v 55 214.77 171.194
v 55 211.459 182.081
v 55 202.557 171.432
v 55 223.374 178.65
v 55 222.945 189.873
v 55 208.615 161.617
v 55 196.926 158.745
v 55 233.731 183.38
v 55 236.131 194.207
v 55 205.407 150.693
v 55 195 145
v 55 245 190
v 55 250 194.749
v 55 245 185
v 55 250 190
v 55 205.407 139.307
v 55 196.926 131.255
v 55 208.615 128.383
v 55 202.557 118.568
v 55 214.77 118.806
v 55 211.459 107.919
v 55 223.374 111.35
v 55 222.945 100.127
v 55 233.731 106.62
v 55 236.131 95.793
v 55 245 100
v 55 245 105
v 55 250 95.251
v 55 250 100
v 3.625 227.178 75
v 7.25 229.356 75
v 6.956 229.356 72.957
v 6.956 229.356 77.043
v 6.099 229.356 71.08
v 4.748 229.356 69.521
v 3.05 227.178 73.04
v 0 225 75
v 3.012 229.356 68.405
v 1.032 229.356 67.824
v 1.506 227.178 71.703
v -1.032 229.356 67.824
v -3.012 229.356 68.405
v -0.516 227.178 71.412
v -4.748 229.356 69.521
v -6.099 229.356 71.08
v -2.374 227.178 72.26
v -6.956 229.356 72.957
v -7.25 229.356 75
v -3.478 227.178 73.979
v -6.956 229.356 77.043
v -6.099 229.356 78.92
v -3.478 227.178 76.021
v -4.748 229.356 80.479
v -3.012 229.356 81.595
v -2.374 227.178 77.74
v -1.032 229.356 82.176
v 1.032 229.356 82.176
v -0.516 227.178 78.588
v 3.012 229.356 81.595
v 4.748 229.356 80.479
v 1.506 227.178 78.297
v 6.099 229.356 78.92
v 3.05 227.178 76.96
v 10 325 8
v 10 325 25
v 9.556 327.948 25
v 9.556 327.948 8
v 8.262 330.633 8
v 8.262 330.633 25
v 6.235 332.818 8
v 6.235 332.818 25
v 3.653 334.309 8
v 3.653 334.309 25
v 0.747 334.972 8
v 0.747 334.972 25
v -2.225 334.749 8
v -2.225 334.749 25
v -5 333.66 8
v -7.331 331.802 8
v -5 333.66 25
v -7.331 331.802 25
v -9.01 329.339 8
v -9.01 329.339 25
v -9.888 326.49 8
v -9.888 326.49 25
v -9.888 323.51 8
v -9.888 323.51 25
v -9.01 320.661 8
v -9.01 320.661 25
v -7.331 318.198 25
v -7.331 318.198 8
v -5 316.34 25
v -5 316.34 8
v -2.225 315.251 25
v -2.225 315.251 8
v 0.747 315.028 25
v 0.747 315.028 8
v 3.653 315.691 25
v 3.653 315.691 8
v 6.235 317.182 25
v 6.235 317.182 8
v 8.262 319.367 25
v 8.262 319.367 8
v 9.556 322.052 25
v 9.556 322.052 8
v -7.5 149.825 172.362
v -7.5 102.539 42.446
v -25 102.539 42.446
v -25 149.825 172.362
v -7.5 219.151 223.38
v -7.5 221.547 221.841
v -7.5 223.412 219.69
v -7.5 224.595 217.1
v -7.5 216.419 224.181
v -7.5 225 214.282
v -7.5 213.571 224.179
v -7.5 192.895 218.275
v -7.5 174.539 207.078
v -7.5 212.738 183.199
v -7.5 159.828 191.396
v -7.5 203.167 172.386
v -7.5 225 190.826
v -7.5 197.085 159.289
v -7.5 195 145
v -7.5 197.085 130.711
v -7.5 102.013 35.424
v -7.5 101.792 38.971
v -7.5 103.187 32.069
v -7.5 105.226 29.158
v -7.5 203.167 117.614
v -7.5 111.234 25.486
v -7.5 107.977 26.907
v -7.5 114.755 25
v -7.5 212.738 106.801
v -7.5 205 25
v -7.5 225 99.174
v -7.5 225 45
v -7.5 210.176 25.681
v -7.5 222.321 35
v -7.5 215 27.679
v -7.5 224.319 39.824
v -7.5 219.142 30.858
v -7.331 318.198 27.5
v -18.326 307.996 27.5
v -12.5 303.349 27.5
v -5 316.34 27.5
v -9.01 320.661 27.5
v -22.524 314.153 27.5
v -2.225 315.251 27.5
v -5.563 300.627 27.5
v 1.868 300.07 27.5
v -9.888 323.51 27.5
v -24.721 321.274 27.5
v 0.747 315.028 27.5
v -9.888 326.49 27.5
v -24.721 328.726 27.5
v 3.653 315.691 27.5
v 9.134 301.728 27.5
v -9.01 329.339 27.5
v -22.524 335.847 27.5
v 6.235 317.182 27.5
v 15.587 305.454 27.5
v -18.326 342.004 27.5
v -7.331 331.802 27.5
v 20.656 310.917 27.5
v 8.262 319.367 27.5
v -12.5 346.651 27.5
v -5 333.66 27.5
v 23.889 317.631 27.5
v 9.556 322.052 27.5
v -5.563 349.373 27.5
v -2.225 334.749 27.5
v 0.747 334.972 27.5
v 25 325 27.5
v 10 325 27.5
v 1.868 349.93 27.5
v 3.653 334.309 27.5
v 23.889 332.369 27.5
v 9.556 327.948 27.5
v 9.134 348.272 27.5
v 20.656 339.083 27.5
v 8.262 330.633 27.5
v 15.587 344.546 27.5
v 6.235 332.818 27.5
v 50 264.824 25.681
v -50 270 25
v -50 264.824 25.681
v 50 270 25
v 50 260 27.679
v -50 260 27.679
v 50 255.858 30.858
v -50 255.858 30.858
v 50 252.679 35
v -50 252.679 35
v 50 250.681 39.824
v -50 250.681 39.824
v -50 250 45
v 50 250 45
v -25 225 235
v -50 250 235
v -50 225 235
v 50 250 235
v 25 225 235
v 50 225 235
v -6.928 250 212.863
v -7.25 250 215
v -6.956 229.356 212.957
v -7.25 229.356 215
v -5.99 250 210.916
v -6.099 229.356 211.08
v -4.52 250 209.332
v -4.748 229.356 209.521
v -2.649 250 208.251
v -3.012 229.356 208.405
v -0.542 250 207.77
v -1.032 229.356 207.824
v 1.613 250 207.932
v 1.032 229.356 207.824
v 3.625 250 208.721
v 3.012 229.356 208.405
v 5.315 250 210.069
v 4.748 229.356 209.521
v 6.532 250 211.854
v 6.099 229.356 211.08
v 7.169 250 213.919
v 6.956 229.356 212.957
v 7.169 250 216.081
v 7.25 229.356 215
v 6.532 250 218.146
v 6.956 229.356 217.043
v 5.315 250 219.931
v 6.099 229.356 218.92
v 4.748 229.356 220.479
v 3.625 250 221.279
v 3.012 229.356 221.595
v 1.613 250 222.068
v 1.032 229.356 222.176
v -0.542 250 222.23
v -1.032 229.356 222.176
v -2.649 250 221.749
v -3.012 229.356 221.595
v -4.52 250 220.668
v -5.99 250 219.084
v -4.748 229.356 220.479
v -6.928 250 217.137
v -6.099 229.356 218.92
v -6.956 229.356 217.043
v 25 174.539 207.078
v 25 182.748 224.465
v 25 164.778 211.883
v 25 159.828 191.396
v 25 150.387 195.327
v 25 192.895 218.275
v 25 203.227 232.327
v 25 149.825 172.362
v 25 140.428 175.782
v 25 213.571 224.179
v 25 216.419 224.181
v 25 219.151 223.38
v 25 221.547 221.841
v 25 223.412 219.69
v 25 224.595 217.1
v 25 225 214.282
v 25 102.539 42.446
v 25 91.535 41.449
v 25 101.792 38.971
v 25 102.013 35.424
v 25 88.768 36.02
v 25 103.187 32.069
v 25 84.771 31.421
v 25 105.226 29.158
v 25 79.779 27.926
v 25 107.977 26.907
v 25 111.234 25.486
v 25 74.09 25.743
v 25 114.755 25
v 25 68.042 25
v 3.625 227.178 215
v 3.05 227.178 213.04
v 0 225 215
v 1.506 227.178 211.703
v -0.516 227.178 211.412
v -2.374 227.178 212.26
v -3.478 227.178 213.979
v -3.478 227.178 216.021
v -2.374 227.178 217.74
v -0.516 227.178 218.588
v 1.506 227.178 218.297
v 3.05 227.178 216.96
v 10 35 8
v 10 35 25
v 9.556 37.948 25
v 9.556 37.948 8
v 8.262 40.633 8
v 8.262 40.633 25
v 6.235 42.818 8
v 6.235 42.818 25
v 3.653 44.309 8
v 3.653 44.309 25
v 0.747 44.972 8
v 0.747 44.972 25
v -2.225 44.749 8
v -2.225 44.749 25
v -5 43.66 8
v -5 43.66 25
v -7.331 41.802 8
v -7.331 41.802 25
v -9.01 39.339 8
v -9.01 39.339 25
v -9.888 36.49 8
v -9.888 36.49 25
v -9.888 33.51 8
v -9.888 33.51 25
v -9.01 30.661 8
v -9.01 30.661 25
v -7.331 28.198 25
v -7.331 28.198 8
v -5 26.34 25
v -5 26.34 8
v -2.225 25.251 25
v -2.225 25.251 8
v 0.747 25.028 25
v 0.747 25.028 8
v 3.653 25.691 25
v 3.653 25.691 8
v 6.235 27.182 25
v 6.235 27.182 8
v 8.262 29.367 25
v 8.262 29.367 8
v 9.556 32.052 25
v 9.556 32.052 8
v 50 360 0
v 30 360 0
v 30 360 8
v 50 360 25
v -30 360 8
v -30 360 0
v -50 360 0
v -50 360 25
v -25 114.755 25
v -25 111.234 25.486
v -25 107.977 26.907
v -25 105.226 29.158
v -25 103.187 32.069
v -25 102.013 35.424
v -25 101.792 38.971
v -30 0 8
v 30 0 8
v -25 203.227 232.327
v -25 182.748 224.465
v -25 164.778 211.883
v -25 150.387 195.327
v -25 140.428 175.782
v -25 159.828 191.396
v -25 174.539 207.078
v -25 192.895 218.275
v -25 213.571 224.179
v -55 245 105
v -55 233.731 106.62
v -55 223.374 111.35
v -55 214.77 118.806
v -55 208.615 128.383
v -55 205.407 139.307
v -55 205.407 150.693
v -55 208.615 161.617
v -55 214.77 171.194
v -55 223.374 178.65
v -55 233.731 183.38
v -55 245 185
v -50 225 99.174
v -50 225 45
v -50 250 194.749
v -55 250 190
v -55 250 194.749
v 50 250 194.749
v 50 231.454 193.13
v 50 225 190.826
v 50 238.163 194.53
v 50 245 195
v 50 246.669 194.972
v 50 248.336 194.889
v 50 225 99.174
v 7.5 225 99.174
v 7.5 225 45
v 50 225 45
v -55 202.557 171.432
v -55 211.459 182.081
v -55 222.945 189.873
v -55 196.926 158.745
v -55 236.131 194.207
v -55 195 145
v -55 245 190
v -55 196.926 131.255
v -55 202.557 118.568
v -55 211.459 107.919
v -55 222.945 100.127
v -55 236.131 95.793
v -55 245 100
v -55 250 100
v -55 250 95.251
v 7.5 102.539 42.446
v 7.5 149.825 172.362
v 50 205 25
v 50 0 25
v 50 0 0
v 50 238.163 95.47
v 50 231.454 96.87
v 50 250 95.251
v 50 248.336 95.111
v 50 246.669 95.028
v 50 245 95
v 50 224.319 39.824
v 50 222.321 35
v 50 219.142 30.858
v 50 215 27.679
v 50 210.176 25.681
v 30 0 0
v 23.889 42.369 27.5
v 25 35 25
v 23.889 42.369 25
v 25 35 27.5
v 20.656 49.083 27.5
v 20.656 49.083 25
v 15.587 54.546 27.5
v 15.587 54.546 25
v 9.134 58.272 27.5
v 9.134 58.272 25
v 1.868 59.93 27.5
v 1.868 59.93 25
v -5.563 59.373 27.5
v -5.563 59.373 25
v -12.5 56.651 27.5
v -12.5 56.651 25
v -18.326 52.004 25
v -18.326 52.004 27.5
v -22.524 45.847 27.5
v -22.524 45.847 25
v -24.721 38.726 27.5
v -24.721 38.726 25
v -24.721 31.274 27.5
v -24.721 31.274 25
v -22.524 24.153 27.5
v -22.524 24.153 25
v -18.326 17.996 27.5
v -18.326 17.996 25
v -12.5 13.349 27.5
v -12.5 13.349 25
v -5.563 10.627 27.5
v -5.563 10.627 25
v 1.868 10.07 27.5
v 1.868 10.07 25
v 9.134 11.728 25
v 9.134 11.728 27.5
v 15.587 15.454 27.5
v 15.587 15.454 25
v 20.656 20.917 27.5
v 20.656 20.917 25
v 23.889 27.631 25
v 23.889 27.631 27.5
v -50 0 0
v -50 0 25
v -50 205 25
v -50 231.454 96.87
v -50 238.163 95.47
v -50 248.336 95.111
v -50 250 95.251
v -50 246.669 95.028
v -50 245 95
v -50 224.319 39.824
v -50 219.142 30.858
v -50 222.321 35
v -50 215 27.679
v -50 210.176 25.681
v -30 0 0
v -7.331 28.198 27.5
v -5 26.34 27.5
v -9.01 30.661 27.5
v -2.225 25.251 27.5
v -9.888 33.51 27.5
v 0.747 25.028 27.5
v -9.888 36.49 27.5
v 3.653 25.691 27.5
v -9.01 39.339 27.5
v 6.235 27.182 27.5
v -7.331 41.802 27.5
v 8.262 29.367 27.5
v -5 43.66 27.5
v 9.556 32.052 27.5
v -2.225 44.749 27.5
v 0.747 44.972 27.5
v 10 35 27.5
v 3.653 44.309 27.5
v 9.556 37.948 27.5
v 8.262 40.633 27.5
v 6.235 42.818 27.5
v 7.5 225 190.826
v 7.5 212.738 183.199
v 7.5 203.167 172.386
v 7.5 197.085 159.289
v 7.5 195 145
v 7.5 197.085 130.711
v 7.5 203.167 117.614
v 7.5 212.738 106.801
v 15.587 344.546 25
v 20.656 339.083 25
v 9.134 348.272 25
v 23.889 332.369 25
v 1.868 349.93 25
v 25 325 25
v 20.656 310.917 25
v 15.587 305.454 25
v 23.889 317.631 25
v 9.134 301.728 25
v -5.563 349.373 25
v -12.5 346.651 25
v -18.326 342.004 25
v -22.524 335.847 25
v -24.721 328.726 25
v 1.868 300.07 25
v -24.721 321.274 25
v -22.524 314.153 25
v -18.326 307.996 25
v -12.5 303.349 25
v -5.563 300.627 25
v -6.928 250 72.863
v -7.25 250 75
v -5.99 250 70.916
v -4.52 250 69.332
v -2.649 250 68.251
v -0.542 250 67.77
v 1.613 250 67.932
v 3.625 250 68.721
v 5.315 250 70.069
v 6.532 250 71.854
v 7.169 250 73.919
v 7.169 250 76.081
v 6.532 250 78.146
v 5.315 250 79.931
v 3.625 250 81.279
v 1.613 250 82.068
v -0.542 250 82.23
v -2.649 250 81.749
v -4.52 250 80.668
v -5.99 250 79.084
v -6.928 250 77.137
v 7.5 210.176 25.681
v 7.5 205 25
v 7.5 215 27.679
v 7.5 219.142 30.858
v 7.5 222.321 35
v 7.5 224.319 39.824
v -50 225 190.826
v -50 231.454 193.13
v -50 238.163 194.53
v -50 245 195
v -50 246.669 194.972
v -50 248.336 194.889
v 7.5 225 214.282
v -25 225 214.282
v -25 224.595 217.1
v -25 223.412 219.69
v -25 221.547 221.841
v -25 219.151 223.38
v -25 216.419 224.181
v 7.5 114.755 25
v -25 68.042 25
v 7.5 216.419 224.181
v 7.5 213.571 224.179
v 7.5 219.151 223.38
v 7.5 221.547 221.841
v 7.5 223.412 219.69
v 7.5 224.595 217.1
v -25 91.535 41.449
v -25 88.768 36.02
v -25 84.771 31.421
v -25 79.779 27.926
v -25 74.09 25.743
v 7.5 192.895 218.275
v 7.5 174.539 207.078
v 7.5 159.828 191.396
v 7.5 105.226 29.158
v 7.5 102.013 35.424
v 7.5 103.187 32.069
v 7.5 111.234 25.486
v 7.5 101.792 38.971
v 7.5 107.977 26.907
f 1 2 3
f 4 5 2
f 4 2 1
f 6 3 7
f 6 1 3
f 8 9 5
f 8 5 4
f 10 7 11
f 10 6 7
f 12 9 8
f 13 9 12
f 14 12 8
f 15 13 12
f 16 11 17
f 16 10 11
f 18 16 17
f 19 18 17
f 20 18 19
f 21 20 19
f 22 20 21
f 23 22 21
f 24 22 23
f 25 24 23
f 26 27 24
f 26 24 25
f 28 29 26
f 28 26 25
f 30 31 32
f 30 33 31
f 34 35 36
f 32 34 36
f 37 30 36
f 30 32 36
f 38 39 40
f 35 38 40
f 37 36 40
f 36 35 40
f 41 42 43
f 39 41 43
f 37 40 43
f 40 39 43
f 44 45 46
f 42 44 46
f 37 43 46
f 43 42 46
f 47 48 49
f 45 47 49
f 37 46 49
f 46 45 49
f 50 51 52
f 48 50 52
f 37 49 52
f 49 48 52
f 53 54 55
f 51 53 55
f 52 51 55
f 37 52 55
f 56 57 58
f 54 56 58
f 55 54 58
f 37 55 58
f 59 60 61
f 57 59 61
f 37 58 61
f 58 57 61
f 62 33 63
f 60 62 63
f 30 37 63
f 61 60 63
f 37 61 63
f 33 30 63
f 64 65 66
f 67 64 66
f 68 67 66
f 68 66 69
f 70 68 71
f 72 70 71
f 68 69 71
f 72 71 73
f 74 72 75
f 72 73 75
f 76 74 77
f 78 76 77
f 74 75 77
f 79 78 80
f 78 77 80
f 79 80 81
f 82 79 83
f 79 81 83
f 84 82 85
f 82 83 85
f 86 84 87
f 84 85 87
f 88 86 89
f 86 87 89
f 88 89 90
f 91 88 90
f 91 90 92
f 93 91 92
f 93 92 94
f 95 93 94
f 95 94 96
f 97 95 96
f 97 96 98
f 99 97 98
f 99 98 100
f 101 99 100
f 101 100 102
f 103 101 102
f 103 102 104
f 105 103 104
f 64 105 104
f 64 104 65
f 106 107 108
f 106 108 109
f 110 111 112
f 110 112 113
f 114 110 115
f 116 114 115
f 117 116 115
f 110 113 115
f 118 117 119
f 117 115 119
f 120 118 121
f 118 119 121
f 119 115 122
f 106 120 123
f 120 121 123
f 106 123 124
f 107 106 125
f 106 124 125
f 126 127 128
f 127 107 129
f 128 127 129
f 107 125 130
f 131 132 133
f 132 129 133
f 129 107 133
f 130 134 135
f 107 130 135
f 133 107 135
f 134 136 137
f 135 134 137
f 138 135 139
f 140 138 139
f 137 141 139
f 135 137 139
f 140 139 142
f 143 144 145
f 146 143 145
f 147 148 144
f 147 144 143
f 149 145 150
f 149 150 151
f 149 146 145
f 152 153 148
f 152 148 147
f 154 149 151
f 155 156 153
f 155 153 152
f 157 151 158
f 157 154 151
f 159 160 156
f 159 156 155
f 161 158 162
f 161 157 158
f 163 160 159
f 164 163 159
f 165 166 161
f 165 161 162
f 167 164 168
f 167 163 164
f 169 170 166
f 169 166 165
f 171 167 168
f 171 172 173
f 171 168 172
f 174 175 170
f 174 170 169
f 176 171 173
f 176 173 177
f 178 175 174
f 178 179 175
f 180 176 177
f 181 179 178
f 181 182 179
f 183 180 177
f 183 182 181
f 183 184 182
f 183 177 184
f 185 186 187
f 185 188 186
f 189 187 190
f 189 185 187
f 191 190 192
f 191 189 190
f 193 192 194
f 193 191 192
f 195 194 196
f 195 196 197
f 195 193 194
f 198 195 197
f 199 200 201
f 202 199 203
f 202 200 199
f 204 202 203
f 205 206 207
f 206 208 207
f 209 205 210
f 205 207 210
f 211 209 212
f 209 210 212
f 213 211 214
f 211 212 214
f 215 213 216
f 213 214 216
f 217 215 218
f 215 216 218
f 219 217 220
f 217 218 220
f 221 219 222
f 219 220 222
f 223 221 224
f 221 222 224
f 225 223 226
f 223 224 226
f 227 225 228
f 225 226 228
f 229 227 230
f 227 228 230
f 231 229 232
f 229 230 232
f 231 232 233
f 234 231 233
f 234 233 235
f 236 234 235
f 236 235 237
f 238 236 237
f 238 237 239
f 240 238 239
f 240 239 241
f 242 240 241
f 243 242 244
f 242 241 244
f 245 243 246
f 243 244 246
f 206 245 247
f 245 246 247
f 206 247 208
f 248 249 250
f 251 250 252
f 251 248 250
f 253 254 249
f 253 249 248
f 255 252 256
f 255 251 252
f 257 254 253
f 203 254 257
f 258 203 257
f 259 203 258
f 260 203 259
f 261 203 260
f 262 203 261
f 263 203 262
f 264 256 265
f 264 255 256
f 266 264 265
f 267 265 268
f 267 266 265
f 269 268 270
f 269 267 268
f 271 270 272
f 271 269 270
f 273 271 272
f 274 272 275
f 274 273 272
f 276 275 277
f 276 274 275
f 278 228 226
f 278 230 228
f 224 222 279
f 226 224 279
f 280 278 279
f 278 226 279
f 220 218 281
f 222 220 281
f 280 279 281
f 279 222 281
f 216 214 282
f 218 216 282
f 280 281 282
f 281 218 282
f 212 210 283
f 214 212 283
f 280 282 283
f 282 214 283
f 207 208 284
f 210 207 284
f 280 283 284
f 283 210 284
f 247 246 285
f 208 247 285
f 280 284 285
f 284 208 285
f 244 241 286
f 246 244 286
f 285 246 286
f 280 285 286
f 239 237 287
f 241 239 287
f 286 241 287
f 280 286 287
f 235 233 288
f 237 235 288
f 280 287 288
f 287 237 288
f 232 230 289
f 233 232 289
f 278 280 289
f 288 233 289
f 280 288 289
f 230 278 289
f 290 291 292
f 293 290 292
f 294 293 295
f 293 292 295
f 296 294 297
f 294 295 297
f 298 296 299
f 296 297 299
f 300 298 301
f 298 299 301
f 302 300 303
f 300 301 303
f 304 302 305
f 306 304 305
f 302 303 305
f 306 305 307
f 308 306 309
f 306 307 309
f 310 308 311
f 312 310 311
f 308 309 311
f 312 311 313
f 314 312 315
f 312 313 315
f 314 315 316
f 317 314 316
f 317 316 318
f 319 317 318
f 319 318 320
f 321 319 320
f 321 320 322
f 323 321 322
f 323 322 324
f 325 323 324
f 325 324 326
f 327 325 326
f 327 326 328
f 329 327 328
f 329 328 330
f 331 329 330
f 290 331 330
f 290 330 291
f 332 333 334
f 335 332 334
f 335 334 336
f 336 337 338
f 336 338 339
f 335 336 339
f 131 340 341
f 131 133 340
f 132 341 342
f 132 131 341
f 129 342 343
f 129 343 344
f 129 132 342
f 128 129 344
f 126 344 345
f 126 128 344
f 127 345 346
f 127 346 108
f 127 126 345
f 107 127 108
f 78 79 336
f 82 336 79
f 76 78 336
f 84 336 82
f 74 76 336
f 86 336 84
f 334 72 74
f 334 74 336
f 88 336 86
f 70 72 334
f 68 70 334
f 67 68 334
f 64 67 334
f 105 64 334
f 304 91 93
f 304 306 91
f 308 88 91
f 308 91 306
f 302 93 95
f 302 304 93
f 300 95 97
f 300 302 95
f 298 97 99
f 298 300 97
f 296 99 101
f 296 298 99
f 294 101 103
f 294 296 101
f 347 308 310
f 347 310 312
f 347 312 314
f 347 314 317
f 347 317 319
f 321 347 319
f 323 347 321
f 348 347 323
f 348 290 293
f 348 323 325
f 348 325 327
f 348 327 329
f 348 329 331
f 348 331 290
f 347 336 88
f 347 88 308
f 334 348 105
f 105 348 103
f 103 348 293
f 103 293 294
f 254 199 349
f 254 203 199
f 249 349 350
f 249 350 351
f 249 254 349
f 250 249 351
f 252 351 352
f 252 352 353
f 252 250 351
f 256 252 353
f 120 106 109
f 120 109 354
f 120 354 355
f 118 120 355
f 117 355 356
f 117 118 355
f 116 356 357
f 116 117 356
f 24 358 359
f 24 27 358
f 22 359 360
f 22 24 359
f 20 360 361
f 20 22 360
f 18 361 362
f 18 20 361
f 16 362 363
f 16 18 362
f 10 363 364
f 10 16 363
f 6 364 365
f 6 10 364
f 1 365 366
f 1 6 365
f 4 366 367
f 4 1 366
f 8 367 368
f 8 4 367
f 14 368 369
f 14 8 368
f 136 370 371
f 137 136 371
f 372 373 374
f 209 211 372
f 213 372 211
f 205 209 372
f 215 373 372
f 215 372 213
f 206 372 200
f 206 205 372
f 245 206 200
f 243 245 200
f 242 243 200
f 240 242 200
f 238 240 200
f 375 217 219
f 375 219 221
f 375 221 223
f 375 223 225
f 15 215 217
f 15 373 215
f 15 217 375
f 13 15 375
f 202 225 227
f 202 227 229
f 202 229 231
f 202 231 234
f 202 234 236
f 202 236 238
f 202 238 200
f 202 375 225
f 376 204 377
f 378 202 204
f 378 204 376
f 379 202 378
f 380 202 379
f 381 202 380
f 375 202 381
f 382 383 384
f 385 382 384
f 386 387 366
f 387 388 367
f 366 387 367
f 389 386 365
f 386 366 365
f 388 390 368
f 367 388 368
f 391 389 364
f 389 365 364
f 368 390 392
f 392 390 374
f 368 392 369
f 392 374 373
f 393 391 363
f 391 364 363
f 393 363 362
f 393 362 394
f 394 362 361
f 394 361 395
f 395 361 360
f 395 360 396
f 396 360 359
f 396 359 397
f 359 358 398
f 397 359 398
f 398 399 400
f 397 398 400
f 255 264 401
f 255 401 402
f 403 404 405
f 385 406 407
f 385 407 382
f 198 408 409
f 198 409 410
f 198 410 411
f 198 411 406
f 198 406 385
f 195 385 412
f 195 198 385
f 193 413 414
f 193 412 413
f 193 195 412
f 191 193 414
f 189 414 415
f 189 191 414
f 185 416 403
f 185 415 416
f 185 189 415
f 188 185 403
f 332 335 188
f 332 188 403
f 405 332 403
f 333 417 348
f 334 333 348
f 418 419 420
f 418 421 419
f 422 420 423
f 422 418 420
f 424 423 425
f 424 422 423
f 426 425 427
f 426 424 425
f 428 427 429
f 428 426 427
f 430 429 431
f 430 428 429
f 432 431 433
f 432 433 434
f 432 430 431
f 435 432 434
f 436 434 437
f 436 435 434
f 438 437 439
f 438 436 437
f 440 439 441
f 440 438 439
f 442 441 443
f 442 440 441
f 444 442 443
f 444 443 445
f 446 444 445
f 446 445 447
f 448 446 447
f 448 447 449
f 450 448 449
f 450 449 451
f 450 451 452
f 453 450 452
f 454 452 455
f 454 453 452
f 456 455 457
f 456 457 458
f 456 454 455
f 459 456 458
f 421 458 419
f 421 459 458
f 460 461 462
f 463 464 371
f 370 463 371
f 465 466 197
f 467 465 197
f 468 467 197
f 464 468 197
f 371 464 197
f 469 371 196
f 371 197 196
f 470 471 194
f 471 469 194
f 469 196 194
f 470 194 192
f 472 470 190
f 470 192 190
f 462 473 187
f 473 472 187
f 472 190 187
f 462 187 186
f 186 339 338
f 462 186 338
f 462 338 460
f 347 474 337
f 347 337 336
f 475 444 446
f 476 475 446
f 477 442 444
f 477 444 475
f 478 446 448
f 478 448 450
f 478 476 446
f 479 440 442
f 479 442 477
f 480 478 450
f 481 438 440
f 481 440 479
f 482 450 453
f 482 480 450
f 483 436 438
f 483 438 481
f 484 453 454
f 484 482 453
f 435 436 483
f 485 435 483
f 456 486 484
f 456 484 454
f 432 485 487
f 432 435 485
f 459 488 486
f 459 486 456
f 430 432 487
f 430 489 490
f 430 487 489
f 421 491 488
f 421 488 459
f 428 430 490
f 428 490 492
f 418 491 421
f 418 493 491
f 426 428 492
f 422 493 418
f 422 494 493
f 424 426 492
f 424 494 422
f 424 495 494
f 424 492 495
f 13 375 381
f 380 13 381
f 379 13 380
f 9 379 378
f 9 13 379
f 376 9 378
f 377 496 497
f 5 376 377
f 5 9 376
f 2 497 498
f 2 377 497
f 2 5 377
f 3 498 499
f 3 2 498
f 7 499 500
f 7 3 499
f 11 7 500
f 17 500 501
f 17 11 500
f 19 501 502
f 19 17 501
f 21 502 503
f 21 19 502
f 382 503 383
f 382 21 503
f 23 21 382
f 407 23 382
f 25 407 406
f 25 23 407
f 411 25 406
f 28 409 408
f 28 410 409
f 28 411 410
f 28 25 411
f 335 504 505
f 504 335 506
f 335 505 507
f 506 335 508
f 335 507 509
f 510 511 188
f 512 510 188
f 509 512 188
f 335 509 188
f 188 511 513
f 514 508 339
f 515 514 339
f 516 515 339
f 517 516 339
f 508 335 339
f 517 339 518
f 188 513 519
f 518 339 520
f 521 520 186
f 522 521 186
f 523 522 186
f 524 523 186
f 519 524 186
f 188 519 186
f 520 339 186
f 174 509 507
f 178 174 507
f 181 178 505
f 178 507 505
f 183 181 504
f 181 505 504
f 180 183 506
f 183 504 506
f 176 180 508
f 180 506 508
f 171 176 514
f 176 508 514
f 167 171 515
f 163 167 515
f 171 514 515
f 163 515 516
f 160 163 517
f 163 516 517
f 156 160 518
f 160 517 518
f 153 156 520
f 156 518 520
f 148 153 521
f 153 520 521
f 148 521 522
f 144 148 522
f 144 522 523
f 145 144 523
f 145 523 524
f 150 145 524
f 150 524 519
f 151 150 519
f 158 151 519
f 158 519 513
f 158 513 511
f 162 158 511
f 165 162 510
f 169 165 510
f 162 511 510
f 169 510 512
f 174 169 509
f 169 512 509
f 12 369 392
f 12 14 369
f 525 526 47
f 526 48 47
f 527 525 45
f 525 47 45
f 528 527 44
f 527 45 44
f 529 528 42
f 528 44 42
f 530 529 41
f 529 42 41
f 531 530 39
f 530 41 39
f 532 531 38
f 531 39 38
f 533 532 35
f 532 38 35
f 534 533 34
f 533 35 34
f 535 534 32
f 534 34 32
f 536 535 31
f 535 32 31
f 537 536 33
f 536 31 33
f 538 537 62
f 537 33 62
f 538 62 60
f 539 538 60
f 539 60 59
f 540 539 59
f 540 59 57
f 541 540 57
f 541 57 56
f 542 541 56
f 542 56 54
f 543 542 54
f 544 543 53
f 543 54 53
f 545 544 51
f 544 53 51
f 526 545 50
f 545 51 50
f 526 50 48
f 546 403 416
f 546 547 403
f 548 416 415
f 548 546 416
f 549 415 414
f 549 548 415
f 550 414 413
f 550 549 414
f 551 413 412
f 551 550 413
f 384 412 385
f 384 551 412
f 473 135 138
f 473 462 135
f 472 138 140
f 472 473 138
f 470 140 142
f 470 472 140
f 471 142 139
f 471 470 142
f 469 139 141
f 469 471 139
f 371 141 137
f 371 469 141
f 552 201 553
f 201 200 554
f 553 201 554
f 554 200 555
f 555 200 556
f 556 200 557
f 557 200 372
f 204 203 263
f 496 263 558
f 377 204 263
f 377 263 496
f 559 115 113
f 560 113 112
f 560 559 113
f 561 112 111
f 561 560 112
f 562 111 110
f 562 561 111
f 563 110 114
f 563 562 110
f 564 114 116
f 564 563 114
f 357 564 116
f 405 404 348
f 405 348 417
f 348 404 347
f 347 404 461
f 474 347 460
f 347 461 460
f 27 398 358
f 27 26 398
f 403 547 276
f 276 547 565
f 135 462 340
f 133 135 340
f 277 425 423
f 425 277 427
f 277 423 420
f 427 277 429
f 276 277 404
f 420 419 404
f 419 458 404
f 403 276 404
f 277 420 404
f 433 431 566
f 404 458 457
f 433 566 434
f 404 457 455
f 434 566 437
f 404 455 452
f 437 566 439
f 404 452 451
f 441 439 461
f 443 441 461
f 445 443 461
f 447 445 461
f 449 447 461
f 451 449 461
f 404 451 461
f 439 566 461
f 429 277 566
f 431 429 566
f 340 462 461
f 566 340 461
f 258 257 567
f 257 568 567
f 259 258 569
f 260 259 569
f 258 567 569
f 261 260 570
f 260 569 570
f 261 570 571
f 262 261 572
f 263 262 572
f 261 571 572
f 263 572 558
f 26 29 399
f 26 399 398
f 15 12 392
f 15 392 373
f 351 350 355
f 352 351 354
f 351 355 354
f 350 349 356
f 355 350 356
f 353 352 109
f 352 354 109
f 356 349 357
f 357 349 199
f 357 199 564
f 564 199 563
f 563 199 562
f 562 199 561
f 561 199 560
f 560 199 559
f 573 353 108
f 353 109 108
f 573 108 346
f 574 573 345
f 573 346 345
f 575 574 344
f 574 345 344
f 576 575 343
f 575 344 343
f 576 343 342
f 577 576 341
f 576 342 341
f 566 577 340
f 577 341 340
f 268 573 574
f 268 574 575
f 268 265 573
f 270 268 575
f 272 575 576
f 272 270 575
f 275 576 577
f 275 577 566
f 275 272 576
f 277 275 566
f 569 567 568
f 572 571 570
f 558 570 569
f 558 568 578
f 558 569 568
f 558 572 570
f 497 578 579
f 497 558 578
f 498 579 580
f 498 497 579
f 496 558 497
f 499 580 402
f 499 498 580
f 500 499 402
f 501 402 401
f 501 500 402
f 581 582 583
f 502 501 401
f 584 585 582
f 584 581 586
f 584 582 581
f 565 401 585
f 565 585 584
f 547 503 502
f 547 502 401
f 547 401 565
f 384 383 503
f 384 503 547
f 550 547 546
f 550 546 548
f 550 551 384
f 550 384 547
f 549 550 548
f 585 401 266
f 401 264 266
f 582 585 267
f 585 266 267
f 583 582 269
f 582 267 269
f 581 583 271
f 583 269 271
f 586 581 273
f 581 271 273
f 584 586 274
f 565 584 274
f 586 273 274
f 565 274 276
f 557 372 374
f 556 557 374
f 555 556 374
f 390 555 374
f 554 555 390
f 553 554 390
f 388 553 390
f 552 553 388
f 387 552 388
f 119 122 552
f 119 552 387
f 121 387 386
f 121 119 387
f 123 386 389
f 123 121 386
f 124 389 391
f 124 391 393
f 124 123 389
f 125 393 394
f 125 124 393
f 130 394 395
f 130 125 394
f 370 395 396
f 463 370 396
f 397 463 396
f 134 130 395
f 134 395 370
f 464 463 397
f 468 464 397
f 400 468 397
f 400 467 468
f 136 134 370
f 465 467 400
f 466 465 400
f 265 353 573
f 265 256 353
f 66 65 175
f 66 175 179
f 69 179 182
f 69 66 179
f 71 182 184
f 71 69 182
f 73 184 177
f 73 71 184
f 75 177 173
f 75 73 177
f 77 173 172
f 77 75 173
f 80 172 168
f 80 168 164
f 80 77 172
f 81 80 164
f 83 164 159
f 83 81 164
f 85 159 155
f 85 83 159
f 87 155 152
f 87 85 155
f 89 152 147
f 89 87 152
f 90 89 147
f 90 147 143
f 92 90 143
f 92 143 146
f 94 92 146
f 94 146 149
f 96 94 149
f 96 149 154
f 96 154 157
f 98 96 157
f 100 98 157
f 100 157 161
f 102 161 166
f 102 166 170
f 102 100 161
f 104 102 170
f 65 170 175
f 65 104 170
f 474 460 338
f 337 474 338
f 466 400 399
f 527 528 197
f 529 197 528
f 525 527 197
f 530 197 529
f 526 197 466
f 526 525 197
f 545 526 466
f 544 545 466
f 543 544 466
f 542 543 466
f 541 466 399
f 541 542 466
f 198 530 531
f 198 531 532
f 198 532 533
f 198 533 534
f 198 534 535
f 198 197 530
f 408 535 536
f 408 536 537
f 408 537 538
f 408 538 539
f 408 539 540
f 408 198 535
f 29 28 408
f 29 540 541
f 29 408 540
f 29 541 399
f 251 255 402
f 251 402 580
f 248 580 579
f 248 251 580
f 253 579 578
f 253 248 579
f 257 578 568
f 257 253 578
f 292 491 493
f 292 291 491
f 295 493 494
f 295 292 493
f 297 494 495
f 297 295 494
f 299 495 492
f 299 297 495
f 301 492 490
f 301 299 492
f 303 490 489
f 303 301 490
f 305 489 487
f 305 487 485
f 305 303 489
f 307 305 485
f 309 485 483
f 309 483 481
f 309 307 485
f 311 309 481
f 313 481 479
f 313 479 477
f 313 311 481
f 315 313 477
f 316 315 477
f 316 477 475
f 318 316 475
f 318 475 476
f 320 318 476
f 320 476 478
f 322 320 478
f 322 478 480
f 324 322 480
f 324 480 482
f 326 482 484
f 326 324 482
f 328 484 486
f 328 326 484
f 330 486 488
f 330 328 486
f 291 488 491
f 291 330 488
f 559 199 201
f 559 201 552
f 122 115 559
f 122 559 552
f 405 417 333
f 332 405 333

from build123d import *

# Parameters (mm, degrees)
BOSS_EXTRUDE1_DEPTH        = 50
BOSS_EXTRUDE1_2_DEPTH      = 50
BOSS_EXTRUDE3_DEPTH        = 55
BOSS_EXTRUDE4_DEPTH        = 25
BOSS_EXTRUDE5_DEPTH        = 7.5
M16X1_5_TAPPED_HOLE1_D     = 14.5
M16X1_5_TAPPED_HOLE1_DEPTH = 20.643760512
M16X1_5_TAPPED_HOLE1_TIP   = 4.356239488
SKETCH7_R                  = 25
SKETCH7_R_2                = 10
BOSS_EXTRUDE6_DEPTH        = 2.5
SKETCH7_2_R                = 10
CUT_EXTRUDE1_DEPTH         = 421.386726717
SKETCH8_W                  = 60
SKETCH8_H                  = 8
CUT_EXTRUDE2_DEPTH         = 434.416658655
FILLET1_R                  = 20
FILLET2_R                  = 10
FILLET3_R                  = 10
FILLET4_R                  = 13
FILLET5_R                  = 25


with BuildPart() as part:
    # Sketch2 → Boss-Extrude1 (new, symmetric)
    with BuildSketch(Plane(origin=(0, 0, 0), x_dir=(0, 0, -1), z_dir=(1, 0, 0))):
        with BuildLine():
            ThreePointArc((-190.82575695, 225), (-194.395357186, 237.247665611), (-194.749371855, 250))
            Line((-194.749371855, 250), (-235, 250))
            Line((-235, 250), (-235, 225))
            Line((-235, 225), (-190.82575695, 225))
        make_face()
    extrude(amount=BOSS_EXTRUDE1_DEPTH, both=True)



with BuildPart() as body_2:
    # Sketch2 → Boss-Extrude1 2 (new, symmetric)
    with BuildSketch(Plane(origin=(0, 0, 0), x_dir=(0, 0, -1), z_dir=(1, 0, 0))):
        with BuildLine():
            Line((-99.17424305, 225), (-25, 225))
            Line((-25, 225), (-25, 0))
            Line((-25, 0), (0, 0))
            Line((0, 0), (0, 360))
            Line((0, 360), (-25, 360))
            Line((-25, 360), (-25, 250))
            Line((-25, 250), (-95.250628145, 250))
            ThreePointArc((-95.250628145, 250), (-95.604642814, 237.247665611), (-99.17424305, 225))
        make_face()
    extrude(amount=BOSS_EXTRUDE1_2_DEPTH, both=True)


with BuildPart() as part_1:
    add(part.part)

    add(body_2.part)  # Boss-Extrude3 merges body 2
    # Sketch2<3> → Boss-Extrude3 (add, symmetric)
    with BuildSketch(Plane(origin=(0, 0, 0), x_dir=(0, 0, -1), z_dir=(1, 0, 0))):
        with BuildLine():
            Line((-185, 245), (-190, 245))
            Line((-190, 245), (-190, 250))
            Line((-190, 250), (-194.749371855, 250))
            ThreePointArc((-194.749371855, 250), (-145, 195), (-95.250628145, 250))
            Line((-95.250628145, 250), (-100, 250))
            Line((-100, 250), (-100, 245))
            Line((-100, 245), (-105, 245))
            ThreePointArc((-105, 245), (-145, 205), (-185, 245))
        make_face()
    extrude(amount=BOSS_EXTRUDE3_DEPTH, both=True)

    # Sketch4 → Boss-Extrude4 (add, symmetric)
    with BuildSketch(Plane(origin=(0, 0, 0), x_dir=(0, 0, -1), z_dir=(1, 0, 0))):
        with BuildLine():
            Line((-175.781812899, 140.427664129), (-25, 85.547572365))
            Line((-25, 85.547572365), (-25, 96.18935009))
            Line((-25, 96.18935009), (-172.361611466, 149.824590337))
            ThreePointArc((-172.361611466, 149.824590337), (-210.532163543, 179.113885092), (-225, 225))
            Line((-225, 225), (-235, 225))
            ThreePointArc((-235, 225), (-218.723683986, 173.378120728), (-175.781812899, 140.427664129))
        make_face()
    extrude(amount=BOSS_EXTRUDE4_DEPTH, both=True)

    # Sketch4<3> → Boss-Extrude5 (add, symmetric)
    with BuildSketch(Plane(origin=(0, 0, 0), x_dir=(0, 0, -1), z_dir=(1, 0, 0))):
        with BuildLine():
            Line((-172.361611466, 149.824590337), (-25, 96.18935009))
            Line((-25, 96.18935009), (-25, 225))
            Line((-25, 225), (-99.17424305, 225))
            ThreePointArc((-99.17424305, 225), (-145, 195), (-190.82575695, 225))
            Line((-190.82575695, 225), (-225, 225))
            ThreePointArc((-225, 225), (-210.532163543, 179.113885092), (-172.361611466, 149.824590337))
        make_face()
    extrude(amount=BOSS_EXTRUDE5_DEPTH, both=True)

    # M16x1.5 Tapped Hole1
    with Locations(Plane(origin=(0, 250, 0), x_dir=(1, 0, 0), z_dir=(0, 1, 0))):
        with Locations((0, -215), (0, -75)):
            Hole(M16X1_5_TAPPED_HOLE1_D / 2, depth=M16X1_5_TAPPED_HOLE1_DEPTH)
            with Locations((0, 0, -(M16X1_5_TAPPED_HOLE1_DEPTH + M16X1_5_TAPPED_HOLE1_TIP / 2))):  # 118° drill point
                Cone(0, M16X1_5_TAPPED_HOLE1_D / 2, M16X1_5_TAPPED_HOLE1_TIP, mode=Mode.SUBTRACT)

    # Sketch7 → Boss-Extrude6 (add, symmetric)
    # profile 1 of 2: a face of its own
    with BuildSketch(Plane.XY.offset(25)):
        with Locations((0, 325)):
            Circle(SKETCH7_R)
        with Locations((0, 325)):
            Circle(SKETCH7_R_2, mode=Mode.SUBTRACT)
    # profile 2 of 2: a face of its own
    with BuildSketch(Plane.XY.offset(25)):
        with Locations((0, 35)):
            Circle(SKETCH7_R)
        with Locations((0, 35)):
            Circle(SKETCH7_R_2, mode=Mode.SUBTRACT)
    extrude(amount=BOSS_EXTRUDE6_DEPTH, both=True)

    # Sketch7<2> → Cut-Extrude1 (cut, through all)
    with BuildSketch(Plane.XY.offset(25)):
        with Locations((0, 325)):
            Circle(SKETCH7_2_R)
        with Locations((0, 35)):
            Circle(SKETCH7_2_R)
    extrude(amount=-CUT_EXTRUDE1_DEPTH, mode=Mode.SUBTRACT)

    # Sketch8 → Cut-Extrude2 (cut, through all)
    with BuildSketch(Plane.XZ):
        with Locations((0, 4)):
            Rectangle(SKETCH8_W, SKETCH8_H)
    extrude(amount=-CUT_EXTRUDE2_DEPTH, mode=Mode.SUBTRACT)

    # Fillet1
    fillet1_edges = [part_1.edges().sort_by_distance(p)[0] for p in [
        (-28.75, 225, 25),
        (28.75, 225, 25),
        (0, 250, 25),
    ]]
    fillet(fillet1_edges, radius=FILLET1_R)

    # Fillet2
    fillet2_edges = [part_1.edges().sort_by_distance(p)[0] for p in [
        (16.25, 225, 225),
    ]]
    fillet(fillet2_edges, radius=FILLET2_R)

    # Fillet3
    fillet3_edges = [part_1.edges().sort_by_distance(p)[0] for p in [
        (-16.25, 225, 225),
    ]]
    fillet(fillet3_edges, radius=FILLET3_R)

    # Fillet4
    fillet4_edges = [part_1.edges().sort_by_distance(p)[0] for p in [
        (16.25, 96.18935009, 25),
        (-16.25, 96.18935009, 25),
    ]]
    fillet(fillet4_edges, radius=FILLET4_R)

    # Fillet5
    fillet5_edges = [part_1.edges().sort_by_distance(p)[0] for p in [
        (0, 85.547572365, 25),
    ]]
    fillet(fillet5_edges, radius=FILLET5_R)


solid = part_1.part
